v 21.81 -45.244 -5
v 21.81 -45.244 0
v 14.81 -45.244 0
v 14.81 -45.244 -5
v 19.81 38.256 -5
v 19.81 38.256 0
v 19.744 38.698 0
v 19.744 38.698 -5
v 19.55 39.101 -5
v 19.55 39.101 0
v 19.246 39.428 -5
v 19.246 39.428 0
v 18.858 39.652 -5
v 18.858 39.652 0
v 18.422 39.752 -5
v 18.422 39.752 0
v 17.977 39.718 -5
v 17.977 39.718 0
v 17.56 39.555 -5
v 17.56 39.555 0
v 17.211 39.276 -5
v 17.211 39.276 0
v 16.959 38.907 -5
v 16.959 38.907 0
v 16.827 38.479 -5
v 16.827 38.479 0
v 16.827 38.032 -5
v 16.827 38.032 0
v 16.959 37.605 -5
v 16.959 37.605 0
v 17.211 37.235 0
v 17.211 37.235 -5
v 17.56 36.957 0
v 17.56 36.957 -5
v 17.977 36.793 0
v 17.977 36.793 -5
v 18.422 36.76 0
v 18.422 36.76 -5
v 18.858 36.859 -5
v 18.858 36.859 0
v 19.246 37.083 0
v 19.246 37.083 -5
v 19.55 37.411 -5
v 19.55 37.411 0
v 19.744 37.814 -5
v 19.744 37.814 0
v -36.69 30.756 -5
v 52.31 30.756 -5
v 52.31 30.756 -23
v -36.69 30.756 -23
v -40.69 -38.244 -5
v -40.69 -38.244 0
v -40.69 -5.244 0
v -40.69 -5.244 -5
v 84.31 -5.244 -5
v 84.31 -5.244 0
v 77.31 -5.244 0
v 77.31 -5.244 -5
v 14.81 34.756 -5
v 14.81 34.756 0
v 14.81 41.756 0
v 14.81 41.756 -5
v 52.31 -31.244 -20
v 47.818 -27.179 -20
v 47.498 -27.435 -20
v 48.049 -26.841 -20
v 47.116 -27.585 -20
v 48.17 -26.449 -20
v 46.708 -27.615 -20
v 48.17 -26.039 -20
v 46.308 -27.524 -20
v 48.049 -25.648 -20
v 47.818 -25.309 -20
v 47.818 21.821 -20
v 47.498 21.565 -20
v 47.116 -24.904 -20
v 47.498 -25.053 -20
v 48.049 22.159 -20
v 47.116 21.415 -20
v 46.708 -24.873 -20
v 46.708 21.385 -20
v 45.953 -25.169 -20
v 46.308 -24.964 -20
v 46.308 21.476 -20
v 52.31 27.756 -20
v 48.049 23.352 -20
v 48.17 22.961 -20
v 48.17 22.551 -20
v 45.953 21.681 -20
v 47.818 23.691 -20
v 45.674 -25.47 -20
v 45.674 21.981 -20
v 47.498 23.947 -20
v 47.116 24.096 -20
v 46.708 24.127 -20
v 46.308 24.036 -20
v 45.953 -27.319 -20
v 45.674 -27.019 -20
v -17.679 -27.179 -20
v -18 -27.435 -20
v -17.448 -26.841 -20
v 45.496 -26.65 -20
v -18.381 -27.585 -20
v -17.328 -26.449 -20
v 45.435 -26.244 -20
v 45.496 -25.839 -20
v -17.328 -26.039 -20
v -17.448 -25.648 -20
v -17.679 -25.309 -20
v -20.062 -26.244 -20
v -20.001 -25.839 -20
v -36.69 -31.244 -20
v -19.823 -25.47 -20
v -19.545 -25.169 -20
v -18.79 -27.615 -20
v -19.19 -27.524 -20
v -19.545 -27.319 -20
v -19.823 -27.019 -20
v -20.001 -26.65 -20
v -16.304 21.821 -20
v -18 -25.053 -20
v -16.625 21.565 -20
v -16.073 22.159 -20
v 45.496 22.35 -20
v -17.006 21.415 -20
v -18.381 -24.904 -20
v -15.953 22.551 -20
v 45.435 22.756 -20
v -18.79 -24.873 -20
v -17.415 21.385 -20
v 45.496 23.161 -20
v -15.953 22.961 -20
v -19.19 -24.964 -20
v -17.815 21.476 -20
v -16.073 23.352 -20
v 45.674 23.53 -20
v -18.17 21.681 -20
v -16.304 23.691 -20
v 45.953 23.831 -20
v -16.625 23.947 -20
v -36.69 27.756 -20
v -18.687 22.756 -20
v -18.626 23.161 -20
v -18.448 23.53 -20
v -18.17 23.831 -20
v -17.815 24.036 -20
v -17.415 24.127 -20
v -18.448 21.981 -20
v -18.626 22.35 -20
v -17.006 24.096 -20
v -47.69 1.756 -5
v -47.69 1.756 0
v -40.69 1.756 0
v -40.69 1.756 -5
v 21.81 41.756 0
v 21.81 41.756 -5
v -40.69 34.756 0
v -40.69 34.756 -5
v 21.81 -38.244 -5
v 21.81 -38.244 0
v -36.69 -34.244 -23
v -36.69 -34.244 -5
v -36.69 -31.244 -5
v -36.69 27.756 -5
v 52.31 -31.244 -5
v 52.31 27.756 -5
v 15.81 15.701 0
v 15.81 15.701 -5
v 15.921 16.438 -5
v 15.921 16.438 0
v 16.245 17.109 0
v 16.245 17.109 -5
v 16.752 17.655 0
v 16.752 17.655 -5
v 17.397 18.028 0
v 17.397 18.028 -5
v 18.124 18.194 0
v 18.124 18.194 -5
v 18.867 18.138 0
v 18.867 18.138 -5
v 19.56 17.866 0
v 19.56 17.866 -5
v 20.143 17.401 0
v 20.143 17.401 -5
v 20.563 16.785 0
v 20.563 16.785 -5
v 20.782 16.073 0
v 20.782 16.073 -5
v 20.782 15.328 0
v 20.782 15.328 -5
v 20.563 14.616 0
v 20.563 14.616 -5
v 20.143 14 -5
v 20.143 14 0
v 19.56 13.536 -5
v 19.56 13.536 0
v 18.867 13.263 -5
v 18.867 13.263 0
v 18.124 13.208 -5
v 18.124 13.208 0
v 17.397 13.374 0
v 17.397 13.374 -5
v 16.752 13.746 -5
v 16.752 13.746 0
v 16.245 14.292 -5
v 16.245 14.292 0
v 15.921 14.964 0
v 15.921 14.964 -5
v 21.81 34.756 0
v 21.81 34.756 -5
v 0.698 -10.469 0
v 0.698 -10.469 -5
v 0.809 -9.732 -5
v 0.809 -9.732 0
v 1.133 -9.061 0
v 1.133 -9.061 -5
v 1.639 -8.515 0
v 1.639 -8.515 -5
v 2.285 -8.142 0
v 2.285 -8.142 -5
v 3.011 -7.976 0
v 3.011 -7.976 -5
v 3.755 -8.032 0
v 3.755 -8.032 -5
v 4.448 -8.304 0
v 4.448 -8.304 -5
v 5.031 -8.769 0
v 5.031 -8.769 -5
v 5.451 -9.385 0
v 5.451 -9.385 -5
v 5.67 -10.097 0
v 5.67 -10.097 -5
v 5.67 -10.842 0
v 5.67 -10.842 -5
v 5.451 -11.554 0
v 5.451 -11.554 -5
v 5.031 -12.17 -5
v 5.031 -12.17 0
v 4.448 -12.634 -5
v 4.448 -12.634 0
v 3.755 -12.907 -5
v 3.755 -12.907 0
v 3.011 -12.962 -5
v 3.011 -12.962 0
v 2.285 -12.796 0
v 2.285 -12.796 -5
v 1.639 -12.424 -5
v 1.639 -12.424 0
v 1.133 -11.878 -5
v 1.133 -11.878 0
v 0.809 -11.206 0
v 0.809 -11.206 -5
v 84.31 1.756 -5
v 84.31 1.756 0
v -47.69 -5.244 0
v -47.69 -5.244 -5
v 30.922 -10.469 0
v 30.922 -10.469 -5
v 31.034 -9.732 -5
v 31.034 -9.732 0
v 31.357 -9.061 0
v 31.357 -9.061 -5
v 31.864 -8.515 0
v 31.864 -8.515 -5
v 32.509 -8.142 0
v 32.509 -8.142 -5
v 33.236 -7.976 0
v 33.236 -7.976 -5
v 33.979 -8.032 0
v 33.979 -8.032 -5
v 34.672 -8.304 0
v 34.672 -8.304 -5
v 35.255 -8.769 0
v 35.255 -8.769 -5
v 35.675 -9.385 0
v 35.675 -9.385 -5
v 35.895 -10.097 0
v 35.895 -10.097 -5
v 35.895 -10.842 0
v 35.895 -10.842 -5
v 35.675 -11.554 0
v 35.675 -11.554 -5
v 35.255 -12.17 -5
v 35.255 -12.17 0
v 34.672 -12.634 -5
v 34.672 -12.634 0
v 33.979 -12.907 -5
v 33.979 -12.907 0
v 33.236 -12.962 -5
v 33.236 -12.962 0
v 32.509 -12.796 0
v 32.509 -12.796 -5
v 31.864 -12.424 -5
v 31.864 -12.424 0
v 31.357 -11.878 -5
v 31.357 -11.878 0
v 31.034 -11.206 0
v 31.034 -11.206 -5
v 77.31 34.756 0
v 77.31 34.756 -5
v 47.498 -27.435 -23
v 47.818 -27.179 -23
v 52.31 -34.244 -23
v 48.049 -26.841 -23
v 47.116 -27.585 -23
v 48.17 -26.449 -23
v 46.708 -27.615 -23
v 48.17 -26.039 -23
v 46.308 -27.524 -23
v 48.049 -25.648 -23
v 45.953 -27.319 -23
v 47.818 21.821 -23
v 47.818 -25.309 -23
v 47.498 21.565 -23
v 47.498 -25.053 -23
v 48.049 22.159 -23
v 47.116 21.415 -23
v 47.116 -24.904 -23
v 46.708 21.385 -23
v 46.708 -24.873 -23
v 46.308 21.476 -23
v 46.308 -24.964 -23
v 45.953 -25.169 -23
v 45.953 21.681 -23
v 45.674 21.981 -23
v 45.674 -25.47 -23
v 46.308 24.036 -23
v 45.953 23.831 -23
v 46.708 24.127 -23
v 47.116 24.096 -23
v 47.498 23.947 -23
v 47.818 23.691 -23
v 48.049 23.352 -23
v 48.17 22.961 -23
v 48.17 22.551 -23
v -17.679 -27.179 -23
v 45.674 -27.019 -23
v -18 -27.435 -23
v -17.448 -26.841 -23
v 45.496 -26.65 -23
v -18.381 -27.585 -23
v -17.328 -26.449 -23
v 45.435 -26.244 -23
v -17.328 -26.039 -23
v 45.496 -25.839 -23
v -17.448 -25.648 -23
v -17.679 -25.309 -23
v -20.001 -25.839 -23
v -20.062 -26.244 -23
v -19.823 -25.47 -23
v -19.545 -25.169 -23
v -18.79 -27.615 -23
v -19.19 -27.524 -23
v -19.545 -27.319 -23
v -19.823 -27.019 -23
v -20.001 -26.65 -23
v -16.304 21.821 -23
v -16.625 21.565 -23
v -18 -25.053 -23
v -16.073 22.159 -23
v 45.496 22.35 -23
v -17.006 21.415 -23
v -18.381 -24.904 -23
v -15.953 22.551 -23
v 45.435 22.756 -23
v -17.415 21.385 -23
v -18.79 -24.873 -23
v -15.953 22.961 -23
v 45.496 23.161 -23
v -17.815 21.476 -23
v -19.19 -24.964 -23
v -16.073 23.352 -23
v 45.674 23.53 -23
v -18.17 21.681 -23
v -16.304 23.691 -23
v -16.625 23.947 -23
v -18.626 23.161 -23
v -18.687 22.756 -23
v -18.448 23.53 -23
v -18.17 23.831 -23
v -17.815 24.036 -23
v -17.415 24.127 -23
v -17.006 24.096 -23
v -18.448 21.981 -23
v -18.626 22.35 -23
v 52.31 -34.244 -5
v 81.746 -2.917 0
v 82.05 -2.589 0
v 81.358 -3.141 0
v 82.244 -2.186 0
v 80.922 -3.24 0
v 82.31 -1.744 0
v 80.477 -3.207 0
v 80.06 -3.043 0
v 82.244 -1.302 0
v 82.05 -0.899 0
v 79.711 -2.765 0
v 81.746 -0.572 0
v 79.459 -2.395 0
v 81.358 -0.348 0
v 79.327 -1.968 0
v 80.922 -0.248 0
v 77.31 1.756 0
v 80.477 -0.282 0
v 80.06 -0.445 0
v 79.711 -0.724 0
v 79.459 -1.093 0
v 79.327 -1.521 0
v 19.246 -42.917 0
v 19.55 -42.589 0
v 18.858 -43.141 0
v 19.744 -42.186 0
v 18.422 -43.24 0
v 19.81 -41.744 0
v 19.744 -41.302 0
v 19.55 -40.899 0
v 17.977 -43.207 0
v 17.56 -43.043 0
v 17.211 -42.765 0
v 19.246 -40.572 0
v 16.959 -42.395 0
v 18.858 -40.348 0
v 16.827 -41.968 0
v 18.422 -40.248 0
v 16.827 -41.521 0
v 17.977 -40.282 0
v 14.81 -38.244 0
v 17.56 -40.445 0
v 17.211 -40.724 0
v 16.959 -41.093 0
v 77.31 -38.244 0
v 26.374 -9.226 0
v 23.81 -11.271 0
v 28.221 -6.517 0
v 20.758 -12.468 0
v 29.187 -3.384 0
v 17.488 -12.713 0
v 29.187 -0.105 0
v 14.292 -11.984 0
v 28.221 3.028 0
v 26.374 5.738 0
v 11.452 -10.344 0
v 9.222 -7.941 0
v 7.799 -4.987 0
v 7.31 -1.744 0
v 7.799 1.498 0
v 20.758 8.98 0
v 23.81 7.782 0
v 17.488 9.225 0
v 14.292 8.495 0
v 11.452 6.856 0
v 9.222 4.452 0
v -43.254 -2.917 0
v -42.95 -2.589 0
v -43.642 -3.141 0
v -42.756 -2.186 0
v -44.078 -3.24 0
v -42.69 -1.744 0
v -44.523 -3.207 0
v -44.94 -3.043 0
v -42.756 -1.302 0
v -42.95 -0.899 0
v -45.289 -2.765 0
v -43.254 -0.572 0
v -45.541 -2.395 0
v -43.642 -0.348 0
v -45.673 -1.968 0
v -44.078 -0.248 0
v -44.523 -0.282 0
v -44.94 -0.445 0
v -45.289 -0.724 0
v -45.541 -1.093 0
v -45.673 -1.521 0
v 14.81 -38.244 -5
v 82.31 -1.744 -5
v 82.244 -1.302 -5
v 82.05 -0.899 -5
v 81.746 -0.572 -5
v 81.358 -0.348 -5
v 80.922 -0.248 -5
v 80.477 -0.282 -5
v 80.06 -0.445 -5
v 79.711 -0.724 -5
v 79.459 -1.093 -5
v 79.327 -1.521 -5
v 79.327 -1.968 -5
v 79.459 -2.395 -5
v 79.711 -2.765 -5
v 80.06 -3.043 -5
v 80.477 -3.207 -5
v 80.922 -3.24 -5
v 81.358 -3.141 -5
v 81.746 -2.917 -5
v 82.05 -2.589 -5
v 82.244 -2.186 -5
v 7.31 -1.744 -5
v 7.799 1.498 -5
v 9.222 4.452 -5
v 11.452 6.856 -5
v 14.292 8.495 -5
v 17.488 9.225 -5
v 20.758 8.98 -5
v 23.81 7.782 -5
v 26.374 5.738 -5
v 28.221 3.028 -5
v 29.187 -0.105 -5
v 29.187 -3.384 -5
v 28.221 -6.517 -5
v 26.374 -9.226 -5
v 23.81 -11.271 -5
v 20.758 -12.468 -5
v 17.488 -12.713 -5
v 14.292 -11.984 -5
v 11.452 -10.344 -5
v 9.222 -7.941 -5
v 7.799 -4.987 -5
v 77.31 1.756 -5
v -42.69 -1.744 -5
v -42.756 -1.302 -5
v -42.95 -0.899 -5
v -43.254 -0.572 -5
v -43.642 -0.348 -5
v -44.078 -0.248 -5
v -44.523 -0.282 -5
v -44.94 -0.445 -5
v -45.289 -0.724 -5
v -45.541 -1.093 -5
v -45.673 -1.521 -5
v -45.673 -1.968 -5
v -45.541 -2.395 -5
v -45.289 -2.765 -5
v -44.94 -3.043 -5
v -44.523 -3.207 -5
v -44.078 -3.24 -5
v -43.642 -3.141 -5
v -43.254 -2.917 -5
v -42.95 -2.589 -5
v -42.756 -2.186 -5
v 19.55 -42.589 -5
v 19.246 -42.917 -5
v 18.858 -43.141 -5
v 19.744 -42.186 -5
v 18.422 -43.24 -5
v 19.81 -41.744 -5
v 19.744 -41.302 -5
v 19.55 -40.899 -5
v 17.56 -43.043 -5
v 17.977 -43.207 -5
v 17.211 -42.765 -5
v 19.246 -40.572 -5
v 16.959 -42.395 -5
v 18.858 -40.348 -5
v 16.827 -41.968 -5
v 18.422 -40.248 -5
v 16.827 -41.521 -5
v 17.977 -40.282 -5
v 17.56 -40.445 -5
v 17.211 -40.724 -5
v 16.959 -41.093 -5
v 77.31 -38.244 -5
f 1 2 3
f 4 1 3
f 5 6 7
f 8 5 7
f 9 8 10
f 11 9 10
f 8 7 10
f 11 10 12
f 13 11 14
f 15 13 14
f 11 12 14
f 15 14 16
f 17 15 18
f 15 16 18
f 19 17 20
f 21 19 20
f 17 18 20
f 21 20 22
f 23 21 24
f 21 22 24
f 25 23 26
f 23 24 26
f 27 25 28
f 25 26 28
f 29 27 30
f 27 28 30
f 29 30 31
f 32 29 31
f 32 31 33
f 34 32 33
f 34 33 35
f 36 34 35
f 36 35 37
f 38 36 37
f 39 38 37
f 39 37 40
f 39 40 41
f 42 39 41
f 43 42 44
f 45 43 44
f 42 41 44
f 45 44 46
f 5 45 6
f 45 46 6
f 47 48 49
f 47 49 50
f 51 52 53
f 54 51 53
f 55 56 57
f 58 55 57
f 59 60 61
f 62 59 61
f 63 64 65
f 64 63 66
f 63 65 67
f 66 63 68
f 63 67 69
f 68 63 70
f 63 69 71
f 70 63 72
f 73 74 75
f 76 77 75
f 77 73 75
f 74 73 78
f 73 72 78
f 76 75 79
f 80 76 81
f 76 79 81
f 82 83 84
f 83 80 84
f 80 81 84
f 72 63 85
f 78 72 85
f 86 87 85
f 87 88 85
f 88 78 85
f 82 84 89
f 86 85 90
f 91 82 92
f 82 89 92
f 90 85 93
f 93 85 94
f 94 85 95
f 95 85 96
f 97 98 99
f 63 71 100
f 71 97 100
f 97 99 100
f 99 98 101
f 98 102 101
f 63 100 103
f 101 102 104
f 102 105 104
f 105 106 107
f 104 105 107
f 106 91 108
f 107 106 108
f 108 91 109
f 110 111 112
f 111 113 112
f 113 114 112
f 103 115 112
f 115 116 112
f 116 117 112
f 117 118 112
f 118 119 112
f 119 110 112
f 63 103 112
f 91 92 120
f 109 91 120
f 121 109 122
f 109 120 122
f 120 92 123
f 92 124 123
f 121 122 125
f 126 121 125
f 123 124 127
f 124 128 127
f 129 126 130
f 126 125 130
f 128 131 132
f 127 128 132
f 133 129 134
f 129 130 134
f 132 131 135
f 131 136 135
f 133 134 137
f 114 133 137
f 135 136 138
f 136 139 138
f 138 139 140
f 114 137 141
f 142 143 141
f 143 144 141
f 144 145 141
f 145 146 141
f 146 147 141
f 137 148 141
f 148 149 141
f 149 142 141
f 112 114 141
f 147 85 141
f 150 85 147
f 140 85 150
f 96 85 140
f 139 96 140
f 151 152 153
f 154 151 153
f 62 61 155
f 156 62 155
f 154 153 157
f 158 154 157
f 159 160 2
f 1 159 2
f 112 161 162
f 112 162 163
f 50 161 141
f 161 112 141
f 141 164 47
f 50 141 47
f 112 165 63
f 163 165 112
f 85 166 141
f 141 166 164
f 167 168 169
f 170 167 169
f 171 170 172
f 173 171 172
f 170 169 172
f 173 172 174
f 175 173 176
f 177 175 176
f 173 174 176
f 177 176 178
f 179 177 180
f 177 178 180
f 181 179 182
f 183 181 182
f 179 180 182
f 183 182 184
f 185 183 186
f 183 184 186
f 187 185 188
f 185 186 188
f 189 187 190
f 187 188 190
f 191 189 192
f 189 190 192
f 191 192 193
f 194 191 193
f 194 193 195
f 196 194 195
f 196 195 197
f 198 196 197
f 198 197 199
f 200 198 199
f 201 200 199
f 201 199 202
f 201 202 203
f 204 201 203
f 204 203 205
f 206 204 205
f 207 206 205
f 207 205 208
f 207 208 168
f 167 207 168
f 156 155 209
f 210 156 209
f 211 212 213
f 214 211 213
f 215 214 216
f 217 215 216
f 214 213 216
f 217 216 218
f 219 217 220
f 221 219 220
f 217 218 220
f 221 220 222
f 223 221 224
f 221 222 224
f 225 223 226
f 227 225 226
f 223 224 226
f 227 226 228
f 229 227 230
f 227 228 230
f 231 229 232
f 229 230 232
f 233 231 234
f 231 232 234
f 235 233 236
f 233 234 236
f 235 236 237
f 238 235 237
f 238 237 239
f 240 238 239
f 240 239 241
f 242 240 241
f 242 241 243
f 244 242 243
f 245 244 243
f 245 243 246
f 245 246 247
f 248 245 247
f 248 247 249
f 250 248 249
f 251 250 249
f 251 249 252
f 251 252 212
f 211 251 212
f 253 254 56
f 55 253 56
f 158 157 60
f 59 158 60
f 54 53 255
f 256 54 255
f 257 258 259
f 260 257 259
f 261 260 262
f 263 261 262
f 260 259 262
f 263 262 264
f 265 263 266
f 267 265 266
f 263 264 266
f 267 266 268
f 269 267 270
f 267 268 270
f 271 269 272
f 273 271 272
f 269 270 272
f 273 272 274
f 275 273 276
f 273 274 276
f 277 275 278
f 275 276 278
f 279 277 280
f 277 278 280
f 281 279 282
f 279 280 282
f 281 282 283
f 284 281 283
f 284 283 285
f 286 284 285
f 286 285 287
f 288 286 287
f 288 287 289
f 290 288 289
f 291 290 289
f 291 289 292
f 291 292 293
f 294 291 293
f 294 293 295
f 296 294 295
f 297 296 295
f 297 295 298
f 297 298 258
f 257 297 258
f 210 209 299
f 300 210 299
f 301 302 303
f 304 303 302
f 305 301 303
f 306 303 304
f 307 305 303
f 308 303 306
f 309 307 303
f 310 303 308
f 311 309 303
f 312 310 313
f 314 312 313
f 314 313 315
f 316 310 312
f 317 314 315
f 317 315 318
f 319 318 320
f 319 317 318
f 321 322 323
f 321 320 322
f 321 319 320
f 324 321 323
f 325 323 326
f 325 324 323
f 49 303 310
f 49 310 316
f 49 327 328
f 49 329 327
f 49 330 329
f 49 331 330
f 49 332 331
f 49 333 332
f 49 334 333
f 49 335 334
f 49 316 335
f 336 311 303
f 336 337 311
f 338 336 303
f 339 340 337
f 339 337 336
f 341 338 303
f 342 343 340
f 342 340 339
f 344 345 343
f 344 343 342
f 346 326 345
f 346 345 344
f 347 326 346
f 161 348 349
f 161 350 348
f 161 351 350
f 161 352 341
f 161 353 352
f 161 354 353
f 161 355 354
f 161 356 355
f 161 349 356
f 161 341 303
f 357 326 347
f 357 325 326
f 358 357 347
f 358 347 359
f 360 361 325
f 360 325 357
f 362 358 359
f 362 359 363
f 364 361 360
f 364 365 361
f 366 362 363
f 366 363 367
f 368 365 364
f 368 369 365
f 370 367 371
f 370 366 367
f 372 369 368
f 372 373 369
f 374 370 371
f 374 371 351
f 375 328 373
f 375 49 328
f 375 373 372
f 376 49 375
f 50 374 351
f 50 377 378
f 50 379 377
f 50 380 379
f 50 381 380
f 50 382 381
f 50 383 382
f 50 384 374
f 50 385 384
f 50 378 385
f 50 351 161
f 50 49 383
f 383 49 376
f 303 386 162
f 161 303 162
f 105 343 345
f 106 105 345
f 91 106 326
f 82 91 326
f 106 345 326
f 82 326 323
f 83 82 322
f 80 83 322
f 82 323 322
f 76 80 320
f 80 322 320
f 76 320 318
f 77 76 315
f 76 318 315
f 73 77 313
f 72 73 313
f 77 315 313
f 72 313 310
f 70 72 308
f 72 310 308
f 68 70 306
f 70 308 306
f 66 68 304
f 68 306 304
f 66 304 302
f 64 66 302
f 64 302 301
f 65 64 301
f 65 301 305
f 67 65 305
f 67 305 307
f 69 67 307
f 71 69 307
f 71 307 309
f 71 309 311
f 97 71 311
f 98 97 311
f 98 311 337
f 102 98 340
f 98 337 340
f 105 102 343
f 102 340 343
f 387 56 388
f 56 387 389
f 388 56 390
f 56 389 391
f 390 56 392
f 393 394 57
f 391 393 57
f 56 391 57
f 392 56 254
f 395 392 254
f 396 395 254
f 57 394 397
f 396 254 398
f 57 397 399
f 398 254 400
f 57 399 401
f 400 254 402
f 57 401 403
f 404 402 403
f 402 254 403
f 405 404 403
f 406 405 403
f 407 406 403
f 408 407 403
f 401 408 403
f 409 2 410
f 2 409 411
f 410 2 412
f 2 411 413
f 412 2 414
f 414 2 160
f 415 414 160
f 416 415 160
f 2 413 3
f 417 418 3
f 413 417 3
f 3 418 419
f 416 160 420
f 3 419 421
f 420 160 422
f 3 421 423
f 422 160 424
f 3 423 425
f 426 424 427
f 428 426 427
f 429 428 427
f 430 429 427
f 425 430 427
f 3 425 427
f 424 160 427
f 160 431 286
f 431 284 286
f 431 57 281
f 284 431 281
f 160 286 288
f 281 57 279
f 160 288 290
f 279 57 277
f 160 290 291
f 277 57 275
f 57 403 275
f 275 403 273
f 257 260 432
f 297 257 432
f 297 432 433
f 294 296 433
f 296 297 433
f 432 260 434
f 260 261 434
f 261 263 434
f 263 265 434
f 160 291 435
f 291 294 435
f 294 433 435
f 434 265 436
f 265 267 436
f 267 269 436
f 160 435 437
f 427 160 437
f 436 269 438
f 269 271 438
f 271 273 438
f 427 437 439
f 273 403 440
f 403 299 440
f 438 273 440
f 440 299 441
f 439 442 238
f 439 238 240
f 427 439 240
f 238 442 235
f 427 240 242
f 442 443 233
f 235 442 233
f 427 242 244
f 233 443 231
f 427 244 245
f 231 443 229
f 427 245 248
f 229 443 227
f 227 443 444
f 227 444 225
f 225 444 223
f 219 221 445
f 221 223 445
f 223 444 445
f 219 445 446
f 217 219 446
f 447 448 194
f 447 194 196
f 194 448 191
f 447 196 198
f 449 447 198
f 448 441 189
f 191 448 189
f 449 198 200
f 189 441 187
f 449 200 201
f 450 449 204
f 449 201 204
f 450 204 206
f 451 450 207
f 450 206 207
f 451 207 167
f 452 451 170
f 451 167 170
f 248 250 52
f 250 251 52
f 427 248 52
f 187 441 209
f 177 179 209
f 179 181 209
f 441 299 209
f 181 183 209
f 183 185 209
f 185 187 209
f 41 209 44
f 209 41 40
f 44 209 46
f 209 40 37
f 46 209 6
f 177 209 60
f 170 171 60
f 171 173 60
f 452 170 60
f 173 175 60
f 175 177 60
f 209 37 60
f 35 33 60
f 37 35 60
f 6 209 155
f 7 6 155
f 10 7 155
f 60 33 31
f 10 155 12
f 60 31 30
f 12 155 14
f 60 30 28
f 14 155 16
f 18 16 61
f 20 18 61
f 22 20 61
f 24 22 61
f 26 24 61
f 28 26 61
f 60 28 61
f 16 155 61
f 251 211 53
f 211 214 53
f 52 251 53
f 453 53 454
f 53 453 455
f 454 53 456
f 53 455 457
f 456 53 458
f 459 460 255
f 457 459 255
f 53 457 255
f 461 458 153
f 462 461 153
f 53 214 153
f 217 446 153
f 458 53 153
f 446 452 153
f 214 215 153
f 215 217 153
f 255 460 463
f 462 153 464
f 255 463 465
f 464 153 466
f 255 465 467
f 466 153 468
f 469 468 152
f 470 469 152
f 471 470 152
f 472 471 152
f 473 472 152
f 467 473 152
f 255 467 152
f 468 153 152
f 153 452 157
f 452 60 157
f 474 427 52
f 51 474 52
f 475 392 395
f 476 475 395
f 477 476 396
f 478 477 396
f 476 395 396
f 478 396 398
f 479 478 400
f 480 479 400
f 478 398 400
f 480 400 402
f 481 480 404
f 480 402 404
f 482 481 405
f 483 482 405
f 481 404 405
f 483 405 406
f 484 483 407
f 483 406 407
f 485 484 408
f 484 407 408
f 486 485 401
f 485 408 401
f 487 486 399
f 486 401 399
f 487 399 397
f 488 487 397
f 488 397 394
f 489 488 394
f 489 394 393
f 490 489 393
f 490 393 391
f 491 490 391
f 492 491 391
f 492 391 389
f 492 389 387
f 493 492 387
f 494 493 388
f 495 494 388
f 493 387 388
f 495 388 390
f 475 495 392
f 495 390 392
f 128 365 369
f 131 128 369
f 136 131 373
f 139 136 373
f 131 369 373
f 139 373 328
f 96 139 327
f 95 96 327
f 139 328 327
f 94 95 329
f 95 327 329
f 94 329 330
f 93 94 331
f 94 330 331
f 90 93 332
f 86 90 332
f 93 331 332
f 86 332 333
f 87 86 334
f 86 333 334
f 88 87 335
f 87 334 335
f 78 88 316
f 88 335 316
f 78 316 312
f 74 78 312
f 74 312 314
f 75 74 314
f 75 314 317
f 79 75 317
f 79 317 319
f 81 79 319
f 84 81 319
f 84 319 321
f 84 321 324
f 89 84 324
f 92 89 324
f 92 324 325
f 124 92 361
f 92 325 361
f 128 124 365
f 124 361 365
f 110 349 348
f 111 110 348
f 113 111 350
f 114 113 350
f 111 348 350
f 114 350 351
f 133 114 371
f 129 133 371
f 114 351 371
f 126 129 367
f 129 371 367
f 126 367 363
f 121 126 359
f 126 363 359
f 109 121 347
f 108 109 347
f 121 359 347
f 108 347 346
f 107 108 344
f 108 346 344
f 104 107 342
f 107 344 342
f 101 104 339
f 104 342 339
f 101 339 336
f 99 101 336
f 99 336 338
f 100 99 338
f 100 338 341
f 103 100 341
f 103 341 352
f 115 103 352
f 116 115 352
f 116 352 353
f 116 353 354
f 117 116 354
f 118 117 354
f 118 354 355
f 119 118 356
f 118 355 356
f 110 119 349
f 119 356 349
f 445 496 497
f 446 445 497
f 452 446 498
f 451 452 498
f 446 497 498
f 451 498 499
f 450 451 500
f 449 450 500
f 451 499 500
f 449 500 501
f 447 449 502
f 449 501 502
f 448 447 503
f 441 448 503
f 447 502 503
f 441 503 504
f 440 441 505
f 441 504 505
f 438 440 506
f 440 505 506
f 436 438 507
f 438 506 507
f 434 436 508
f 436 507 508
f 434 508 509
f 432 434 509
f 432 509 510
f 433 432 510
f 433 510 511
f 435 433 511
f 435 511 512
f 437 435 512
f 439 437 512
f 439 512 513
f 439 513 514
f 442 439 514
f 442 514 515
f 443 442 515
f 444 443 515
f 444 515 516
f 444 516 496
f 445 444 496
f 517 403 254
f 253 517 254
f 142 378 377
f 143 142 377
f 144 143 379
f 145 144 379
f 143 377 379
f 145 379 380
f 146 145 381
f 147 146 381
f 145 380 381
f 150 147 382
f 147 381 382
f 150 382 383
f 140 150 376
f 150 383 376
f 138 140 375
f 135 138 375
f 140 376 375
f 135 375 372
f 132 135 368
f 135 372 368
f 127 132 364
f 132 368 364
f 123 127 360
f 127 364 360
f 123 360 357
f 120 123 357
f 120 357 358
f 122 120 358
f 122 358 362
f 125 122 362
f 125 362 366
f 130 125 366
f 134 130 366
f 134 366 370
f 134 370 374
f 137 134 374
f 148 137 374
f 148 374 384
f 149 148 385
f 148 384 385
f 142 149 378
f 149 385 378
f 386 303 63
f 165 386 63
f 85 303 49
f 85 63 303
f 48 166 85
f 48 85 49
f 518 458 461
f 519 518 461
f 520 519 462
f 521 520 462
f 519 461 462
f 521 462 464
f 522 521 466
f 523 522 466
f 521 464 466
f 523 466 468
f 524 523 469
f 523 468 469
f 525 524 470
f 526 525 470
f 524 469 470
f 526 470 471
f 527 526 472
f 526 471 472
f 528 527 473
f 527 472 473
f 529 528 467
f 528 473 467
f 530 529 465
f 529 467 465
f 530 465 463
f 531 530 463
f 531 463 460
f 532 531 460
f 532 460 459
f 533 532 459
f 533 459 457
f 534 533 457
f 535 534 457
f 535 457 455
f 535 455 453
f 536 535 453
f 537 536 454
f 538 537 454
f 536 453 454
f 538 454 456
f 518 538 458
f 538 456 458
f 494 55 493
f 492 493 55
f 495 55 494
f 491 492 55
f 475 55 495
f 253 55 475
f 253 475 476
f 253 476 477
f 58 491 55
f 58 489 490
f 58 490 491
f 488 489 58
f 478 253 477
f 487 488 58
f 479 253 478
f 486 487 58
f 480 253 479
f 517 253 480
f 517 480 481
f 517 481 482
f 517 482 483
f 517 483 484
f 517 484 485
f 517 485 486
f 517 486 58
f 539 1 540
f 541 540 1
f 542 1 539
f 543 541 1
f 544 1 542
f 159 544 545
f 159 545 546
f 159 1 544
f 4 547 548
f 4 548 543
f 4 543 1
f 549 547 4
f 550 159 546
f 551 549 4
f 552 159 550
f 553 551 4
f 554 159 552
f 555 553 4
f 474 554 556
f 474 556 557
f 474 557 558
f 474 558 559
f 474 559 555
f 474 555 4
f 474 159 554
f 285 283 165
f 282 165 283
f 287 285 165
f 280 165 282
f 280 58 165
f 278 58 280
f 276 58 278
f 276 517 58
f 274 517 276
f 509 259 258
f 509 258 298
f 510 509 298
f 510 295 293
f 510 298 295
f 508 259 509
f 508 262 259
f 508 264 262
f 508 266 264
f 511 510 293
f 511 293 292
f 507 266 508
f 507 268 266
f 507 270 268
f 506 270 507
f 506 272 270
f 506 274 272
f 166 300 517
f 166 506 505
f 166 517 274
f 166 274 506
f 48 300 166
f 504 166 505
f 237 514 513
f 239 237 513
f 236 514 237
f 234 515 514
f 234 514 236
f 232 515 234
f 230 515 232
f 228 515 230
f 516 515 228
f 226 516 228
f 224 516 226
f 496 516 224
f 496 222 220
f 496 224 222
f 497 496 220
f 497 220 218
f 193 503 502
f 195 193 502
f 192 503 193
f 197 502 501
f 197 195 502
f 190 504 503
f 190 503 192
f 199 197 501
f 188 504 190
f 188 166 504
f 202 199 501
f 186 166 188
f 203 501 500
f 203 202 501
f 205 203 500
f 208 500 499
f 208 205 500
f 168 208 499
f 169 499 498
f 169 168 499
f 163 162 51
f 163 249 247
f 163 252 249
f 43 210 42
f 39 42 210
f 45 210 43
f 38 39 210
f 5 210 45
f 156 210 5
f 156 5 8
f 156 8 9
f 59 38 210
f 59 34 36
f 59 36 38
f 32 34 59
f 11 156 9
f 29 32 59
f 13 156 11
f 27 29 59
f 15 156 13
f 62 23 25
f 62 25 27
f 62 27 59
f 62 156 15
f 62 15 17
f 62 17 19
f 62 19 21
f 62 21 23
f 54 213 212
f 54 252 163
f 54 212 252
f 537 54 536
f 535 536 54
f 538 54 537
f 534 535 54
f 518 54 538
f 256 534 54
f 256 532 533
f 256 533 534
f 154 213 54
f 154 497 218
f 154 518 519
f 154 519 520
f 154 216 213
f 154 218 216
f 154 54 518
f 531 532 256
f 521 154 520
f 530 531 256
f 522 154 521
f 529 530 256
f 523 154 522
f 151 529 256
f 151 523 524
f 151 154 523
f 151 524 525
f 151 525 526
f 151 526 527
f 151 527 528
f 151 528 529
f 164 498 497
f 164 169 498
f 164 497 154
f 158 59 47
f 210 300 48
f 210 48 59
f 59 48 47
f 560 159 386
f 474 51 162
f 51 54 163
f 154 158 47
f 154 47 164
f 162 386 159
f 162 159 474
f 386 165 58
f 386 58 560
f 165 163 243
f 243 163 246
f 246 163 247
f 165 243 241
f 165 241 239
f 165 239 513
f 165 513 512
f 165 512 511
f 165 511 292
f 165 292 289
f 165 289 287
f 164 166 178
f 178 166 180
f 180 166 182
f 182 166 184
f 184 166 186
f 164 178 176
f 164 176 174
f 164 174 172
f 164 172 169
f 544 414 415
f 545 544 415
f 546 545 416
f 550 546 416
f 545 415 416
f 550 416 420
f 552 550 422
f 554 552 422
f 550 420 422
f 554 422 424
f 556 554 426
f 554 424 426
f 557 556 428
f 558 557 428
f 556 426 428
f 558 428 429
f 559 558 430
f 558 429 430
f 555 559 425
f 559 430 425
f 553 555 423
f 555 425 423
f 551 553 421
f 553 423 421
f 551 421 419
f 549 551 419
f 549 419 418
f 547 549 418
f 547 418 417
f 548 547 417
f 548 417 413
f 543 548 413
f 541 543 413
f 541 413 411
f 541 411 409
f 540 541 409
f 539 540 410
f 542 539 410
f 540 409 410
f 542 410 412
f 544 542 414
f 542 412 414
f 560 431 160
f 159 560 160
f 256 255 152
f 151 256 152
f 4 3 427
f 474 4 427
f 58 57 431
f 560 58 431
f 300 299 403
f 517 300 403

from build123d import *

# Parameters (mm, degrees)
CROQUIS1_R                  = 1.5
SALIENTE_EXTRUIR1_DEPTH     = 5
CROQUIS3_R                  = 11
CROQUIS3_R_2                = 2.5
CORTAR_EXTRUIR1_DEPTH       = 10
CROQUIS4_W                  = 89
CROQUIS4_H                  = 65
CROQUIS4_W_2                = 83
CROQUIS4_H_2                = 59
SALIENTE_EXTRUIR3_DEPTH     = 18
CROQUIS5_W                  = 83
CROQUIS5_H                  = 59
CROQUIS5_R                  = 1.375
SALIENTE_EXTRUIR4_DEPTH     = 3
SALIENTE_EXTRUIR5_START     = -89
SALIENTE_EXTRUIR5_OUTLINE_W = 15
SALIENTE_EXTRUIR5_OUTLINE_H = 59
SALIENTE_EXTRUIR5_DEPTH     = 89


# Read off the part's stored shape, not the designer's step: Saliente-Extruir5
with BuildPart() as part:
    # Croquis1 → Saliente-Extruir1 (new body)
    with BuildSketch(Plane.XY):
        Polygon((-40.689655172, 34.755747126), (14.810344828, 34.755747126), (14.810344828, 41.755747126), (21.810344828, 41.755747126), (21.810344828, 34.755747126), (77.310344828, 34.755747126), (77.310344828, 1.755747126), (84.310344828, 1.755747126), (84.310344828, -5.244252874), (77.310344828, -5.244252874), (77.310344828, -38.244252874), (21.810344828, -38.244252874), (21.810344828, -45.244252874), (14.810344828, -45.244252874), (14.810344828, -38.244252874), (-40.689655172, -38.244252874), (-40.689655172, -5.244252874), (-47.689655172, -5.244252874), (-47.689655172, 1.755747126), (-40.689655172, 1.755747126), align=None)
        with Locations((18.310344828, 38.255747126)):
            Circle(CROQUIS1_R, mode=Mode.SUBTRACT)
        with Locations((-44.189655172, -1.744252874)):
            Circle(CROQUIS1_R, mode=Mode.SUBTRACT)
        with Locations((80.810344828, -1.744252874)):
            Circle(CROQUIS1_R, mode=Mode.SUBTRACT)
        with Locations((18.310344828, -41.744252874)):
            Circle(CROQUIS1_R, mode=Mode.SUBTRACT)
    extrude(amount=-SALIENTE_EXTRUIR1_DEPTH)

    # Croquis3 → Cortar-Extruir1 (cut)
    with BuildSketch(Plane(origin=(0, 0, -5), x_dir=(-1, 0, 0), z_dir=(0, 0, -1))):
        with Locations((-18.310344828, -1.744252874)):
            Circle(CROQUIS3_R)
        with Locations((-18.310344828, 15.700747126)):
            Circle(CROQUIS3_R_2)
        with Locations((-3.198201532, -10.469252874)):
            Circle(CROQUIS3_R_2)
        with Locations((-33.422488124, -10.469252874)):
            Circle(CROQUIS3_R_2)
    extrude(amount=-CORTAR_EXTRUIR1_DEPTH, mode=Mode.SUBTRACT)

    # Croquis4 → Saliente-Extruir3 (add)
    with BuildSketch(Plane(origin=(0, 0, -5), x_dir=(-1, 0, 0), z_dir=(0, 0, -1))):
        with Locations((-7.810344828, -1.744252874)):
            Rectangle(CROQUIS4_W, CROQUIS4_H)
        with Locations((-7.810344828, -1.744252874)):
            Rectangle(CROQUIS4_W_2, CROQUIS4_H_2, mode=Mode.SUBTRACT)
    extrude(amount=SALIENTE_EXTRUIR3_DEPTH)

    # Croquis5 → Saliente-Extruir4 (add)
    with BuildSketch(Plane(origin=(0, 0, -23), x_dir=(-1, 0, 0), z_dir=(0, 0, -1))):
        with Locations((-7.810344828, -1.744252874)):
            Rectangle(CROQUIS5_W, CROQUIS5_H)
        with Locations((-46.810344828, 22.755747126)):
            Circle(CROQUIS5_R, mode=Mode.SUBTRACT)
        with Locations((-46.810344828, -26.244252874)):
            Circle(CROQUIS5_R, mode=Mode.SUBTRACT)
        with Locations((17.312228898, 22.755747126)):
            Circle(CROQUIS5_R, mode=Mode.SUBTRACT)
        with Locations((18.687228898, -26.244252874)):
            Circle(CROQUIS5_R, mode=Mode.SUBTRACT)
    extrude(amount=-SALIENTE_EXTRUIR4_DEPTH)

    # Saliente-Extruir5 outline → Saliente-Extruir5 (cut)
    with BuildSketch(Plane(origin=(52.310344828, 0, 0), x_dir=(0, 0, -1), z_dir=(1, 0, 0)).offset(SALIENTE_EXTRUIR5_START)):
        with Locations((12.5, -1.744252874)):
            Rectangle(SALIENTE_EXTRUIR5_OUTLINE_W, SALIENTE_EXTRUIR5_OUTLINE_H)
    extrude(amount=SALIENTE_EXTRUIR5_DEPTH, mode=Mode.SUBTRACT)


solid = part.part
